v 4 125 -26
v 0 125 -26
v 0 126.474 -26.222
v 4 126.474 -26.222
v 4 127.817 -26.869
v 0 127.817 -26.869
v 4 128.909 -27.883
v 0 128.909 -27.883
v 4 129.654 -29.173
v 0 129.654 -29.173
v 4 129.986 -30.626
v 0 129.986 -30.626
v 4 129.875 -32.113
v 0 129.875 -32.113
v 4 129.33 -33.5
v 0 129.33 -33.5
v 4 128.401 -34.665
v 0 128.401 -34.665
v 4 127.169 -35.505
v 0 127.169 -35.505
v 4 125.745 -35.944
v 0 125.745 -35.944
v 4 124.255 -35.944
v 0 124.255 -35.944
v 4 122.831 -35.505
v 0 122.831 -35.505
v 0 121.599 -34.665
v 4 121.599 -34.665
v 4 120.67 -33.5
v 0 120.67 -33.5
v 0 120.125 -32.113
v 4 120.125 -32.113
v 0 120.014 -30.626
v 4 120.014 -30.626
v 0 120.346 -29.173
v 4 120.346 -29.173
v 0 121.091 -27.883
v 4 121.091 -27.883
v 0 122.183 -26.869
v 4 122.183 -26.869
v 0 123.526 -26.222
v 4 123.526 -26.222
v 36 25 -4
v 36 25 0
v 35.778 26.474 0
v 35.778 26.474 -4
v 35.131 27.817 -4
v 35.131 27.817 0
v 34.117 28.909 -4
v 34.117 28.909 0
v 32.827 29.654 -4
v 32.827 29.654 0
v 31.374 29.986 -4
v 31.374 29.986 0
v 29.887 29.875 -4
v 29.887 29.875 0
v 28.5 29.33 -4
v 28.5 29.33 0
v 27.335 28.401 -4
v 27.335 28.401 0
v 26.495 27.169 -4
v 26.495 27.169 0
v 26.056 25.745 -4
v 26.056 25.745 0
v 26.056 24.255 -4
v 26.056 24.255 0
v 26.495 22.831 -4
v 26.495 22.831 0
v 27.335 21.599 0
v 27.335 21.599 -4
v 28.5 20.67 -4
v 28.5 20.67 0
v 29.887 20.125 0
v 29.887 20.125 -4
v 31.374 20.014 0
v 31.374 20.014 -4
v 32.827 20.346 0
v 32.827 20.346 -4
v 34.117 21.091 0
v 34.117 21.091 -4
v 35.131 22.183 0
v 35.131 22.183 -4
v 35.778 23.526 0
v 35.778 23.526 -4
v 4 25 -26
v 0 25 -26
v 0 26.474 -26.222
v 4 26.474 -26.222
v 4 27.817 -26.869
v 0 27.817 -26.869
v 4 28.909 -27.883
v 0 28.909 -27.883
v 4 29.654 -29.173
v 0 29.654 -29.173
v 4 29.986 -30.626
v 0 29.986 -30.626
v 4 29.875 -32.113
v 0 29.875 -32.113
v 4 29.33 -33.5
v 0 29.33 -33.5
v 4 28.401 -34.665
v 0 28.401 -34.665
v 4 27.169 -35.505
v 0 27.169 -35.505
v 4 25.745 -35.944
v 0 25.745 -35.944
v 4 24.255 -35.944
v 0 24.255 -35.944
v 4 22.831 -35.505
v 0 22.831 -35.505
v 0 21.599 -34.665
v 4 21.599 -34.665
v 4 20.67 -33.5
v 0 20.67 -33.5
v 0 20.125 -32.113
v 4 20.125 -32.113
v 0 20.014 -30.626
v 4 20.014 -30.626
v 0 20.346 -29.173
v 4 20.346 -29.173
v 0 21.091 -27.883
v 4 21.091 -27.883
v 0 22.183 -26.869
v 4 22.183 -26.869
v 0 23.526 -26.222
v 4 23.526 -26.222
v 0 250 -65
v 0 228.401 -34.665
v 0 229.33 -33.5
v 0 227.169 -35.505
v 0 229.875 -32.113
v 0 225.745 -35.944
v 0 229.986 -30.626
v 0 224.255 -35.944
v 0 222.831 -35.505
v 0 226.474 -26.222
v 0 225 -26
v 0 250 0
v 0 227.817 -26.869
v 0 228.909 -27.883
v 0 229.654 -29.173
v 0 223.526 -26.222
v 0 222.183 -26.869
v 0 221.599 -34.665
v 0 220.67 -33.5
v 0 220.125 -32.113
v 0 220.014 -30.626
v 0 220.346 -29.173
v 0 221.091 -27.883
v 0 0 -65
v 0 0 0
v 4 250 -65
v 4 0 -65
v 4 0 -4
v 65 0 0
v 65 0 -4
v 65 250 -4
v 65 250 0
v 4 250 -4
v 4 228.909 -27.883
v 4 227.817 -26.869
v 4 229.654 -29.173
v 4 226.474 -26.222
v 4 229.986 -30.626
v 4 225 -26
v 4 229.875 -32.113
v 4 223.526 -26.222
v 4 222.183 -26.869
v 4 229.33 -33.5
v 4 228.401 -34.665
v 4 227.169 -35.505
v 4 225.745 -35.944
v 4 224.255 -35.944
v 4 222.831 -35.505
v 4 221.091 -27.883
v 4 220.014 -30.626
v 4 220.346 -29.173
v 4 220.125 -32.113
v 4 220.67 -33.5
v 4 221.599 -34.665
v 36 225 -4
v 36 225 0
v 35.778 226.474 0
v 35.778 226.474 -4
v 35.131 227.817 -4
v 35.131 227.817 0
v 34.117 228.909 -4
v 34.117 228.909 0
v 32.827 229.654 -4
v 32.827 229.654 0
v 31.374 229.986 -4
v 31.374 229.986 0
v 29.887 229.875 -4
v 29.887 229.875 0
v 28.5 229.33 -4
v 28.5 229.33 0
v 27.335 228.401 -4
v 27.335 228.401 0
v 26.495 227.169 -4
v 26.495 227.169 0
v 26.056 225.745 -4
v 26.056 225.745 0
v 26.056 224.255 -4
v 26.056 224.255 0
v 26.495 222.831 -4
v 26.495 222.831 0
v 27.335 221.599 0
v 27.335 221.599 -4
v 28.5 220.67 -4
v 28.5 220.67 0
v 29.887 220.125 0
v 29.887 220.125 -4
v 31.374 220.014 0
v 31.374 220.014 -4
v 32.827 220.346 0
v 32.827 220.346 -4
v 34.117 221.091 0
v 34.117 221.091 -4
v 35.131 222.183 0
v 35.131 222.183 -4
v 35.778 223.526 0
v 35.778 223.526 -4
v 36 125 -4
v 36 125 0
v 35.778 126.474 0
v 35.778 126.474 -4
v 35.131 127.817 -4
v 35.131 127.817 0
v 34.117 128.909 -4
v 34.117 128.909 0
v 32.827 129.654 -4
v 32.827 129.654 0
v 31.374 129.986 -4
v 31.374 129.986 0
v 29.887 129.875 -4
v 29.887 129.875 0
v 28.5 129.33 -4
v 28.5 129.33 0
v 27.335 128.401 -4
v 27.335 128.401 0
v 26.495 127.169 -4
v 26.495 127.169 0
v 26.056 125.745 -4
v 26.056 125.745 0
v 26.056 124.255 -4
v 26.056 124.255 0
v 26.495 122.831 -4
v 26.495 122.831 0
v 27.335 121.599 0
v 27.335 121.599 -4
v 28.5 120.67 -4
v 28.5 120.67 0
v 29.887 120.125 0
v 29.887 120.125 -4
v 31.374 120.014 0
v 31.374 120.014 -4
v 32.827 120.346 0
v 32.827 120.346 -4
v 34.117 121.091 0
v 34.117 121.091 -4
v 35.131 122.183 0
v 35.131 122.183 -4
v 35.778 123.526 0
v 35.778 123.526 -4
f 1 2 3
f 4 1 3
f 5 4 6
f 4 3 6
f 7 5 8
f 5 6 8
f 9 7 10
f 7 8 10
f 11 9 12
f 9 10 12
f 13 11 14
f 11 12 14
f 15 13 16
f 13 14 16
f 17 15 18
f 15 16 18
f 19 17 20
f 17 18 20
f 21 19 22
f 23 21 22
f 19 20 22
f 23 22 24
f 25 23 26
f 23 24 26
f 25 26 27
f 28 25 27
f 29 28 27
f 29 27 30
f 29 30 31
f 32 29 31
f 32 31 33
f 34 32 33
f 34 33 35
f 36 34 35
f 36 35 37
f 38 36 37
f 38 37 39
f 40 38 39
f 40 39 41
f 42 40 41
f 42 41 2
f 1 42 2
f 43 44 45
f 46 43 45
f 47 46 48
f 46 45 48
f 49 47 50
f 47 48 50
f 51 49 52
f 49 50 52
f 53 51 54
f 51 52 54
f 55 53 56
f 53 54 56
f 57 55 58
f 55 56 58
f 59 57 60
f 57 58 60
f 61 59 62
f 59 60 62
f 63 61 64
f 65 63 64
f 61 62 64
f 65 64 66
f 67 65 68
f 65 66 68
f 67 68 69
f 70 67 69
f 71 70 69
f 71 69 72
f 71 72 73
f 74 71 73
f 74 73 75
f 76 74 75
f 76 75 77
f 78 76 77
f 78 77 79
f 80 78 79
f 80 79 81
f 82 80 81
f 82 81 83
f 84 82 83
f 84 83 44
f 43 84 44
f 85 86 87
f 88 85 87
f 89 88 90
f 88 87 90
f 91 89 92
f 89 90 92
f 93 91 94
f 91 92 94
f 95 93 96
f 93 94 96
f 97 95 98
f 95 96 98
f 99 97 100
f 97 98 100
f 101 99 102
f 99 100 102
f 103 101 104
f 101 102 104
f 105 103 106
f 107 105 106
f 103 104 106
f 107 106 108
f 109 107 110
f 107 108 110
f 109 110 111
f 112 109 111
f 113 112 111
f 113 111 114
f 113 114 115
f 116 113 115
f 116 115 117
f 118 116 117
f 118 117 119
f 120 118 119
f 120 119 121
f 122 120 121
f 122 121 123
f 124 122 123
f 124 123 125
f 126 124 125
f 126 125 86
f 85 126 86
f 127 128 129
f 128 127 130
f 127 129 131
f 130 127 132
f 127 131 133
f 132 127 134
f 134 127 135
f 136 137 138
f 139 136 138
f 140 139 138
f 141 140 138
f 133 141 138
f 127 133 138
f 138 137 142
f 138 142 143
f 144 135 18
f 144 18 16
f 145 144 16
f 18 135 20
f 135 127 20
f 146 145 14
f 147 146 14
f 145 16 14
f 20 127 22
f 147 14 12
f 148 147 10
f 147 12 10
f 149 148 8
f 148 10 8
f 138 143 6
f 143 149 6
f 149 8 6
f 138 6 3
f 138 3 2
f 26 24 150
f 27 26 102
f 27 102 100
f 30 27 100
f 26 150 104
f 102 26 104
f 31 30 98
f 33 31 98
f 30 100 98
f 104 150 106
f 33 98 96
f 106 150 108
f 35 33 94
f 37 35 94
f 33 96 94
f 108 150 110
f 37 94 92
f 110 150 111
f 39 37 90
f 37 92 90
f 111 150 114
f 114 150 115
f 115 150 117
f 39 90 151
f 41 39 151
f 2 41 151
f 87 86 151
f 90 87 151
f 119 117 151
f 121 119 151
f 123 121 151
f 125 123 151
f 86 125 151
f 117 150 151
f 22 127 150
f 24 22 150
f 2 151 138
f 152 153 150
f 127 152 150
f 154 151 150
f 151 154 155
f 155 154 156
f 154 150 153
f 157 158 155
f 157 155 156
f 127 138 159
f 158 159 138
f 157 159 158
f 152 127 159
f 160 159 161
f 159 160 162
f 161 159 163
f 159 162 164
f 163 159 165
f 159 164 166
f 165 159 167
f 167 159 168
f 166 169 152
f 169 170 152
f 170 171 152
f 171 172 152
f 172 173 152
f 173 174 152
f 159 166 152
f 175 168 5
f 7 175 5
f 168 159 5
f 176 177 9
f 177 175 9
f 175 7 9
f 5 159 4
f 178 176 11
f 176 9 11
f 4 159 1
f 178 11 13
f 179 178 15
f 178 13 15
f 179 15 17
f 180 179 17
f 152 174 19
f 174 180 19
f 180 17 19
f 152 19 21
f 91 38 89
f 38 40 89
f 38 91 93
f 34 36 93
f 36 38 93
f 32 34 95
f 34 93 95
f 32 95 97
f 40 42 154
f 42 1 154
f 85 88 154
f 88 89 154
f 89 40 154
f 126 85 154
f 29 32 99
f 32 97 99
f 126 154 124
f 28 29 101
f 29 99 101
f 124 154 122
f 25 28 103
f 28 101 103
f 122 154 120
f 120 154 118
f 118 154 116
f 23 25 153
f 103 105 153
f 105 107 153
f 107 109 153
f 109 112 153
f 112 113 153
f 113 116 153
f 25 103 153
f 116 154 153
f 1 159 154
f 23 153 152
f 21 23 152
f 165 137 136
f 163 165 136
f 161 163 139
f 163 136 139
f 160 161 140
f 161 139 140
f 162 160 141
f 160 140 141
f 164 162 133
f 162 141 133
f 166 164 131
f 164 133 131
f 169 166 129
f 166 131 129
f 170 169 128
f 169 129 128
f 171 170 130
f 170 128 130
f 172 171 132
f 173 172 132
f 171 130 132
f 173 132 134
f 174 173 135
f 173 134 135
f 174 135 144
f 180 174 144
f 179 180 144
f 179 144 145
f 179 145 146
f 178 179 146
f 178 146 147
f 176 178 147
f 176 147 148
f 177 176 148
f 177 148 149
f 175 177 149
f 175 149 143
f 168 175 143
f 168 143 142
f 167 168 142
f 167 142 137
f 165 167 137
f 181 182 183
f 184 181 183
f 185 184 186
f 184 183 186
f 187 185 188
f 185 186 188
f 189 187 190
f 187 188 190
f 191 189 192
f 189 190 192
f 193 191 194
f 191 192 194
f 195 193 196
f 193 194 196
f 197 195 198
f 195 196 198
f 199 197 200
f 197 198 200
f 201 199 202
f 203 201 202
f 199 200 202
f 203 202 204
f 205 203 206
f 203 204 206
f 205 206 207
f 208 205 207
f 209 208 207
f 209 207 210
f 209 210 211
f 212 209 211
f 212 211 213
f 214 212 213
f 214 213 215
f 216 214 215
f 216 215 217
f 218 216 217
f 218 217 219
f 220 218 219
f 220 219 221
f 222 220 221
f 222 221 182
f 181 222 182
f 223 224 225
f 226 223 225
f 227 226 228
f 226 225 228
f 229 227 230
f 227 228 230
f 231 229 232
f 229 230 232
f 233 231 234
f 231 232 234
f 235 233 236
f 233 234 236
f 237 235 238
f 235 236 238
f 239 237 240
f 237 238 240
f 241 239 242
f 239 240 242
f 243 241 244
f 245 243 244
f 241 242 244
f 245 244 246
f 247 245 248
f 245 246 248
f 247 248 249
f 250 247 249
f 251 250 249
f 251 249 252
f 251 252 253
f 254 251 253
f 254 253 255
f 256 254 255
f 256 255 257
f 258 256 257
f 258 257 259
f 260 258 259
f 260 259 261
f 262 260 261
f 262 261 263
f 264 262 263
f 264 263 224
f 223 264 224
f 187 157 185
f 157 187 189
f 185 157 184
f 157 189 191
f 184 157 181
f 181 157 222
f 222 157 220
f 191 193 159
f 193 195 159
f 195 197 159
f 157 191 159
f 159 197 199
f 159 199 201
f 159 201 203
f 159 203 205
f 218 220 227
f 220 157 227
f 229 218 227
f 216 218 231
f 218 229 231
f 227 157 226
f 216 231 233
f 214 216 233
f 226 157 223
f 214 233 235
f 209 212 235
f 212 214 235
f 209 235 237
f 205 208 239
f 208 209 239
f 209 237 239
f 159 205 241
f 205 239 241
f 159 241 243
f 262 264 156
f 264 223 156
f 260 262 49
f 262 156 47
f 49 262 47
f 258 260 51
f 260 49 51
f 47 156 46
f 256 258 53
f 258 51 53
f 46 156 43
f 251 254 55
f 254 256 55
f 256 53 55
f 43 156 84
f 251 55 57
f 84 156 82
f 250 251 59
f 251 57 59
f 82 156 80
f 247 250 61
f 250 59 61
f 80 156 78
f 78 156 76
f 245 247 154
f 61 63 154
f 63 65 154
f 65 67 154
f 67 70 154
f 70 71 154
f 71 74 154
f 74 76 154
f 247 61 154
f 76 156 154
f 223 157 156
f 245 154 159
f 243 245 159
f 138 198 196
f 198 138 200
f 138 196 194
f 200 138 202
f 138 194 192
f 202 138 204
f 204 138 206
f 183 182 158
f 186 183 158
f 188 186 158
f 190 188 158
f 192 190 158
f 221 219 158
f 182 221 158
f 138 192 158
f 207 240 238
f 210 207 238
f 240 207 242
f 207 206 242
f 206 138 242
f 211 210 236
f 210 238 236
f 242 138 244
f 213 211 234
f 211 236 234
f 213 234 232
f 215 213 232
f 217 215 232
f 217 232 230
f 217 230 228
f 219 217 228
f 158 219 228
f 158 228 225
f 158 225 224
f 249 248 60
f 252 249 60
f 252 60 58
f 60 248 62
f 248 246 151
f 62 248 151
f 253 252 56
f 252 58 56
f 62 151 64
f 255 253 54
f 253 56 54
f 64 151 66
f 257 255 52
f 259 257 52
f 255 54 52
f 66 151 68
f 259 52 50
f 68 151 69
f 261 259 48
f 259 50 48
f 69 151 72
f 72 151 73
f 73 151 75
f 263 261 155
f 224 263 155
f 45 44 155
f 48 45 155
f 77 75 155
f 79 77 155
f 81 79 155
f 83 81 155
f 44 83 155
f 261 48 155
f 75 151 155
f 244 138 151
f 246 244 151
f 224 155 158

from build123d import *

# Parameters (mm, degrees)
EXTRUDE_1_DEPTH     = 250
SKETCH_6_R          = 5
CUT_EXTRUDE_1_DEPTH = 10
SKETCH_7_R          = 5
CUT_EXTRUDE_2_DEPTH = 10


with BuildPart() as part:
    # Эскиз1 → Вытянуть-Тонкостенный1 (new body)
    with BuildSketch(Plane(origin=(0, 0, 0), x_dir=(1, 0, 0), z_dir=(0, 1, 0))):
        Polygon((0, 65), (0, 0), (65, 0), (65, 4), (4, 4), (4, 65), align=None)
    extrude(amount=EXTRUDE_1_DEPTH)

    # Эскиз6 → Вырез-Вытянуть1 (cut)
    with BuildSketch(Plane.ZY):
        with Locations((-31, 25)):
            Circle(SKETCH_6_R)
        with Locations((-31, 125)):
            Circle(SKETCH_6_R)
        with Locations((-31, 225)):
            Circle(SKETCH_6_R)
    extrude(amount=-CUT_EXTRUDE_1_DEPTH, mode=Mode.SUBTRACT)

    # Эскиз7 → Вырез-Вытянуть2 (cut)
    with BuildSketch(Plane.XY):
        with Locations((31, 25)):
            Circle(SKETCH_7_R)
        with Locations((31, 125)):
            Circle(SKETCH_7_R)
        with Locations((31, 225)):
            Circle(SKETCH_7_R)
    extrude(amount=-CUT_EXTRUDE_2_DEPTH, mode=Mode.SUBTRACT)


solid = part.part
